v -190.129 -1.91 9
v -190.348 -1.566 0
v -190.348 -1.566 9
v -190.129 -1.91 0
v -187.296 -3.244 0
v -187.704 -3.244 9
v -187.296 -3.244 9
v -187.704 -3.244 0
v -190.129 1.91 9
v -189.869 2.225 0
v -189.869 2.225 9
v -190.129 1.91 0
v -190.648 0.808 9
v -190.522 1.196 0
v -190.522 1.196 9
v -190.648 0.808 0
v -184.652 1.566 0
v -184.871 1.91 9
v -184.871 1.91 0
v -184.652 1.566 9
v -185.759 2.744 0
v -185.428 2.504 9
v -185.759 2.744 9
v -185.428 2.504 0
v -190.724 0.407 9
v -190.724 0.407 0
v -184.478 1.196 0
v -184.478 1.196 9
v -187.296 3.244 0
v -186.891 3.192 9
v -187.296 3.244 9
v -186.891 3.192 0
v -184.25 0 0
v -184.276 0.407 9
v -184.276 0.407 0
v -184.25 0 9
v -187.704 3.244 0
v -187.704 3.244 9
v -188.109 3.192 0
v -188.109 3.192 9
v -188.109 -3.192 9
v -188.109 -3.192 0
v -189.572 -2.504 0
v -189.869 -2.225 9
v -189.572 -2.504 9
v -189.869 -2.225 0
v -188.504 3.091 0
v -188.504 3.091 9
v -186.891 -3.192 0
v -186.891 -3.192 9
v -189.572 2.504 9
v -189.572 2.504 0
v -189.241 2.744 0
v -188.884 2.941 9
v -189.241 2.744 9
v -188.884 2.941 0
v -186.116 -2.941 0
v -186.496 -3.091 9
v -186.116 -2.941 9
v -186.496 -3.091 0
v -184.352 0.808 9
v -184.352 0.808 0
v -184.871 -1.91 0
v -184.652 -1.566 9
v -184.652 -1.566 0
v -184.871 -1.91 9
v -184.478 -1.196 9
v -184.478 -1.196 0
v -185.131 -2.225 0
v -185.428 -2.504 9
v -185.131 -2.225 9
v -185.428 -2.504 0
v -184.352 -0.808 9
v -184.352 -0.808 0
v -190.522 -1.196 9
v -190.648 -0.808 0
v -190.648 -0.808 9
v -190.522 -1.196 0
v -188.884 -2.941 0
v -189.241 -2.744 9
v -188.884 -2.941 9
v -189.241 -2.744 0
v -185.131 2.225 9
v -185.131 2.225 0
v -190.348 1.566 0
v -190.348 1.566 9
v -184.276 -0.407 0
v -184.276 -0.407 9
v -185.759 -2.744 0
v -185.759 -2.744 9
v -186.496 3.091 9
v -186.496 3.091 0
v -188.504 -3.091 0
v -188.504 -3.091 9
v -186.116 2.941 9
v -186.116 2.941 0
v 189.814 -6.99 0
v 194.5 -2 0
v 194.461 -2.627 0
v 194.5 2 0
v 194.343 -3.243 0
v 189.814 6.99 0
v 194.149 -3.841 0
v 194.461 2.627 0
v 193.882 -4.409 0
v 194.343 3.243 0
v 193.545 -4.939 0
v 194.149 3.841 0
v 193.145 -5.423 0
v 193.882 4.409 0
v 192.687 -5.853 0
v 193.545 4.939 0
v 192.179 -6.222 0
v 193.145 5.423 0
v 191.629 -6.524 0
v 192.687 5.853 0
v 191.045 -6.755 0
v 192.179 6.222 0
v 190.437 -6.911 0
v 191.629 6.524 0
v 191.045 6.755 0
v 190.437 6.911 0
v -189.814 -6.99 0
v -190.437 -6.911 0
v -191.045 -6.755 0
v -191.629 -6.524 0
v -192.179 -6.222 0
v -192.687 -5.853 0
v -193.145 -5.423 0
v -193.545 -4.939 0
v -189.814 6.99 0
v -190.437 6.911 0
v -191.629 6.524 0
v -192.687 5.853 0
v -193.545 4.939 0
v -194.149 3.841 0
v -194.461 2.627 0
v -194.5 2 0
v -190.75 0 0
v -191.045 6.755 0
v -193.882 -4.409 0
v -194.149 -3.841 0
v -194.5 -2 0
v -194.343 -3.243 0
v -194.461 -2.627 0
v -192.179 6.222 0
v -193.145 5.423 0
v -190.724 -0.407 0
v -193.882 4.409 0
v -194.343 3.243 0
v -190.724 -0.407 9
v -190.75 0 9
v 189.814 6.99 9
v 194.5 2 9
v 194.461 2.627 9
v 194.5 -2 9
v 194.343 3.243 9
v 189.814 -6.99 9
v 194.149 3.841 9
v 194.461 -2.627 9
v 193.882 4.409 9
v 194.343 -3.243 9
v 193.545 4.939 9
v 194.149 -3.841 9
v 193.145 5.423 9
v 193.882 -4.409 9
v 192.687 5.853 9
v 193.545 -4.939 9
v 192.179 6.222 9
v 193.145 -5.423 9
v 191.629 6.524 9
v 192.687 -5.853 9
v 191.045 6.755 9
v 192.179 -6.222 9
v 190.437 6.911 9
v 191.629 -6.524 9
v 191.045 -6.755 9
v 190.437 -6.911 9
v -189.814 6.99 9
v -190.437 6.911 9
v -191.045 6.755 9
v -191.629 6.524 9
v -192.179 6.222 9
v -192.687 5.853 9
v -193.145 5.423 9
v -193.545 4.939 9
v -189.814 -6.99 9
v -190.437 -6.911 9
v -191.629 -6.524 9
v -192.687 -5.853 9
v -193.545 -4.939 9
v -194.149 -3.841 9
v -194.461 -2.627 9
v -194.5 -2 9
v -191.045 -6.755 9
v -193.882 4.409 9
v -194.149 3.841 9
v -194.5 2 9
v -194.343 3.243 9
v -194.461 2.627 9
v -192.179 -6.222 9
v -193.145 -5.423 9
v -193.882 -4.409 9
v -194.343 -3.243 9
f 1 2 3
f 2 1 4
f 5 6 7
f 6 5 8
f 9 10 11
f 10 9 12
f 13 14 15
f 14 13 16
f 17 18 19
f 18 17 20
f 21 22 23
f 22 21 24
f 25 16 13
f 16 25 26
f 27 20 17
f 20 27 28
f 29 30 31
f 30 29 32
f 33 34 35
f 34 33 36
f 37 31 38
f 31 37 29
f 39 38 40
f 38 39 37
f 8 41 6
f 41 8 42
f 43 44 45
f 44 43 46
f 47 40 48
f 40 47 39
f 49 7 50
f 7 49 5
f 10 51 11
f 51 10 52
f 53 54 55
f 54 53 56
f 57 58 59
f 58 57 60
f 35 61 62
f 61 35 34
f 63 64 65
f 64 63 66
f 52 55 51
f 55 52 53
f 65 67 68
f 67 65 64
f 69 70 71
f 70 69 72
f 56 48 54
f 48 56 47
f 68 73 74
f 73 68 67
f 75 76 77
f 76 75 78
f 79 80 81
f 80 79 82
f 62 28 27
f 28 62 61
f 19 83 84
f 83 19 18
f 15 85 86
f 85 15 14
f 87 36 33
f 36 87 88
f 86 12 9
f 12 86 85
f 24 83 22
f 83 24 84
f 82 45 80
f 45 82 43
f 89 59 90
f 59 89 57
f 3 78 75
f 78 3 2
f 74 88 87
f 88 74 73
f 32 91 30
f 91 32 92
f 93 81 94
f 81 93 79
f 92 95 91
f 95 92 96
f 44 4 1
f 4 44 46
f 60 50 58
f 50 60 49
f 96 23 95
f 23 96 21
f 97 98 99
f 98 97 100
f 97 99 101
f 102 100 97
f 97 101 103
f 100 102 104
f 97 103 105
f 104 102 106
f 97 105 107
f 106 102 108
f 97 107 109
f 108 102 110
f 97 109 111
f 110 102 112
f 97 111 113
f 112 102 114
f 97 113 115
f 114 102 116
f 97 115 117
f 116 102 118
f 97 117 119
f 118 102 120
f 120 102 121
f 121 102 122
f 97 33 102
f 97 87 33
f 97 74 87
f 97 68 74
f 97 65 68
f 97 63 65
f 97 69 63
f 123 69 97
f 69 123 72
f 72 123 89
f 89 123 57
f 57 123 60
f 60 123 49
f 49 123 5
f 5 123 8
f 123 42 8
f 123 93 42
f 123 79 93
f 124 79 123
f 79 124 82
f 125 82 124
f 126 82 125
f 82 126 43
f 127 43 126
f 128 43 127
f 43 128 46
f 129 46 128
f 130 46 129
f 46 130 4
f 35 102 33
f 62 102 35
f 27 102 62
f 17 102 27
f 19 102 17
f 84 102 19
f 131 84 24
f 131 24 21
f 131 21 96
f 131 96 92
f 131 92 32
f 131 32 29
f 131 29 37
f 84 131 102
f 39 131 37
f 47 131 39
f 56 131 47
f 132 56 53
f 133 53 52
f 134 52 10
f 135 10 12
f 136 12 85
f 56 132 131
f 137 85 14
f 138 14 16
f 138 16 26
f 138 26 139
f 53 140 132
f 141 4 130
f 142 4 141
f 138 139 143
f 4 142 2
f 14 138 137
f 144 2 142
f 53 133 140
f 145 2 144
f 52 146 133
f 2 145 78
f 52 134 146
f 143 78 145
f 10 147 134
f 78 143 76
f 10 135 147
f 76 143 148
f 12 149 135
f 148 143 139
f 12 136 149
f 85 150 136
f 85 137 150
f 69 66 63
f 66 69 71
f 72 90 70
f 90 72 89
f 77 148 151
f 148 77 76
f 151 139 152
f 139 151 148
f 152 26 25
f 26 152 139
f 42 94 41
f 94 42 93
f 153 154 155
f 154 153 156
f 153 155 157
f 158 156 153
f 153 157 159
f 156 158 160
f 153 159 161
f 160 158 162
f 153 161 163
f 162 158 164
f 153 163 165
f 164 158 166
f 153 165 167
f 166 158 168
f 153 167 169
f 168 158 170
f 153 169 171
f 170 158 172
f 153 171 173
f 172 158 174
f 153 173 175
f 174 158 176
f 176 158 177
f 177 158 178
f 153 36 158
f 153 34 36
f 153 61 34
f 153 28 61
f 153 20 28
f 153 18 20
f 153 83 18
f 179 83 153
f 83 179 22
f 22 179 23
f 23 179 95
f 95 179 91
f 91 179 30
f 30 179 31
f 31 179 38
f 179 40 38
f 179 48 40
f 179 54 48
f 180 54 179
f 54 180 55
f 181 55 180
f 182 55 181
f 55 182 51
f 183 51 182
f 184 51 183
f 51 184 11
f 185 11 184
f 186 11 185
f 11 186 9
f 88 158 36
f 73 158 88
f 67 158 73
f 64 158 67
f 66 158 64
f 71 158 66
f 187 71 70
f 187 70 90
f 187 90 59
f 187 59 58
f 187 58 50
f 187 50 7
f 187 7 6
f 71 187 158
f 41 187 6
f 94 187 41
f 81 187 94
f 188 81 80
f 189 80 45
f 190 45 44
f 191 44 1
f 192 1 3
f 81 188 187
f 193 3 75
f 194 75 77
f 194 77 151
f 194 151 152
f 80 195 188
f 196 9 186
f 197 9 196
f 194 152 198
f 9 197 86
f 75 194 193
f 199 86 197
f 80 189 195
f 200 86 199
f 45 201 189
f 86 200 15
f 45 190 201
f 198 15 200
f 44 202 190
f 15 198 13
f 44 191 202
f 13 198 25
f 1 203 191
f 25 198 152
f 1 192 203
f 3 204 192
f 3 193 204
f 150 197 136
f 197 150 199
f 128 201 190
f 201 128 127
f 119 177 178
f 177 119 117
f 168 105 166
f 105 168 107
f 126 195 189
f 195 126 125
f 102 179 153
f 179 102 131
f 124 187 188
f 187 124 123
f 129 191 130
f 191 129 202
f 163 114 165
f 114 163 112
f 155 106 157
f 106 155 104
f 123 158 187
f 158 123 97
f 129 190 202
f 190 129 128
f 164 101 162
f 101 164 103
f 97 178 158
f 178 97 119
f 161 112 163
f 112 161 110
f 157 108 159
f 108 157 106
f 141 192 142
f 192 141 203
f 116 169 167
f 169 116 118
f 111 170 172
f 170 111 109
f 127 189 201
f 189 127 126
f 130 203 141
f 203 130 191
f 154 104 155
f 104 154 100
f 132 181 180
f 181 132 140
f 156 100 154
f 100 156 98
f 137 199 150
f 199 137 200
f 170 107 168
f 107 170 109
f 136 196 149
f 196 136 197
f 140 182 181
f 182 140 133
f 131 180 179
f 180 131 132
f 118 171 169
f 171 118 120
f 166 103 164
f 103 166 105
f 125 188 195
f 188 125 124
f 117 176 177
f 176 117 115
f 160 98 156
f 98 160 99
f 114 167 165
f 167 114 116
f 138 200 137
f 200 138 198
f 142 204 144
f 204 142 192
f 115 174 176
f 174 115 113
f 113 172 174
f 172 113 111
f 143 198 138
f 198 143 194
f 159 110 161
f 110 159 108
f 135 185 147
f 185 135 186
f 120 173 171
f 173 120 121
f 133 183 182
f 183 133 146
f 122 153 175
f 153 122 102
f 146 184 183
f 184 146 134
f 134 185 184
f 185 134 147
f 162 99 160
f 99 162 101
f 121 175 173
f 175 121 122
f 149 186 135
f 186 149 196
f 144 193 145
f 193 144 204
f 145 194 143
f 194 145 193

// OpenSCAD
$fn = 50;


difference() {
	union() {
		hull() {
			translate(v = [-189.5000000000, 2.0000000000, 0]) {
				cylinder(h = 9, r = 5);
			}
			translate(v = [189.5000000000, 2.0000000000, 0]) {
				cylinder(h = 9, r = 5);
			}
			translate(v = [-189.5000000000, -2.0000000000, 0]) {
				cylinder(h = 9, r = 5);
			}
			translate(v = [189.5000000000, -2.0000000000, 0]) {
				cylinder(h = 9, r = 5);
			}
		}
	}
	union() {
		translate(v = [-187.5000000000, 0.0000000000, 0]) {
			cylinder(h = 9, r = 3.2500000000);
		}
		translate(v = [-187.5000000000, 0.0000000000, 0]) {
			cylinder(h = 9, r = 1.8000000000);
		}
		translate(v = [-187.5000000000, 0.0000000000, 0]) {
			cylinder(h = 9, r = 1.8000000000);
		}
		translate(v = [-187.5000000000, 0.0000000000, 0]) {
			cylinder(h = 9, r = 1.8000000000);
		}
	}
}
